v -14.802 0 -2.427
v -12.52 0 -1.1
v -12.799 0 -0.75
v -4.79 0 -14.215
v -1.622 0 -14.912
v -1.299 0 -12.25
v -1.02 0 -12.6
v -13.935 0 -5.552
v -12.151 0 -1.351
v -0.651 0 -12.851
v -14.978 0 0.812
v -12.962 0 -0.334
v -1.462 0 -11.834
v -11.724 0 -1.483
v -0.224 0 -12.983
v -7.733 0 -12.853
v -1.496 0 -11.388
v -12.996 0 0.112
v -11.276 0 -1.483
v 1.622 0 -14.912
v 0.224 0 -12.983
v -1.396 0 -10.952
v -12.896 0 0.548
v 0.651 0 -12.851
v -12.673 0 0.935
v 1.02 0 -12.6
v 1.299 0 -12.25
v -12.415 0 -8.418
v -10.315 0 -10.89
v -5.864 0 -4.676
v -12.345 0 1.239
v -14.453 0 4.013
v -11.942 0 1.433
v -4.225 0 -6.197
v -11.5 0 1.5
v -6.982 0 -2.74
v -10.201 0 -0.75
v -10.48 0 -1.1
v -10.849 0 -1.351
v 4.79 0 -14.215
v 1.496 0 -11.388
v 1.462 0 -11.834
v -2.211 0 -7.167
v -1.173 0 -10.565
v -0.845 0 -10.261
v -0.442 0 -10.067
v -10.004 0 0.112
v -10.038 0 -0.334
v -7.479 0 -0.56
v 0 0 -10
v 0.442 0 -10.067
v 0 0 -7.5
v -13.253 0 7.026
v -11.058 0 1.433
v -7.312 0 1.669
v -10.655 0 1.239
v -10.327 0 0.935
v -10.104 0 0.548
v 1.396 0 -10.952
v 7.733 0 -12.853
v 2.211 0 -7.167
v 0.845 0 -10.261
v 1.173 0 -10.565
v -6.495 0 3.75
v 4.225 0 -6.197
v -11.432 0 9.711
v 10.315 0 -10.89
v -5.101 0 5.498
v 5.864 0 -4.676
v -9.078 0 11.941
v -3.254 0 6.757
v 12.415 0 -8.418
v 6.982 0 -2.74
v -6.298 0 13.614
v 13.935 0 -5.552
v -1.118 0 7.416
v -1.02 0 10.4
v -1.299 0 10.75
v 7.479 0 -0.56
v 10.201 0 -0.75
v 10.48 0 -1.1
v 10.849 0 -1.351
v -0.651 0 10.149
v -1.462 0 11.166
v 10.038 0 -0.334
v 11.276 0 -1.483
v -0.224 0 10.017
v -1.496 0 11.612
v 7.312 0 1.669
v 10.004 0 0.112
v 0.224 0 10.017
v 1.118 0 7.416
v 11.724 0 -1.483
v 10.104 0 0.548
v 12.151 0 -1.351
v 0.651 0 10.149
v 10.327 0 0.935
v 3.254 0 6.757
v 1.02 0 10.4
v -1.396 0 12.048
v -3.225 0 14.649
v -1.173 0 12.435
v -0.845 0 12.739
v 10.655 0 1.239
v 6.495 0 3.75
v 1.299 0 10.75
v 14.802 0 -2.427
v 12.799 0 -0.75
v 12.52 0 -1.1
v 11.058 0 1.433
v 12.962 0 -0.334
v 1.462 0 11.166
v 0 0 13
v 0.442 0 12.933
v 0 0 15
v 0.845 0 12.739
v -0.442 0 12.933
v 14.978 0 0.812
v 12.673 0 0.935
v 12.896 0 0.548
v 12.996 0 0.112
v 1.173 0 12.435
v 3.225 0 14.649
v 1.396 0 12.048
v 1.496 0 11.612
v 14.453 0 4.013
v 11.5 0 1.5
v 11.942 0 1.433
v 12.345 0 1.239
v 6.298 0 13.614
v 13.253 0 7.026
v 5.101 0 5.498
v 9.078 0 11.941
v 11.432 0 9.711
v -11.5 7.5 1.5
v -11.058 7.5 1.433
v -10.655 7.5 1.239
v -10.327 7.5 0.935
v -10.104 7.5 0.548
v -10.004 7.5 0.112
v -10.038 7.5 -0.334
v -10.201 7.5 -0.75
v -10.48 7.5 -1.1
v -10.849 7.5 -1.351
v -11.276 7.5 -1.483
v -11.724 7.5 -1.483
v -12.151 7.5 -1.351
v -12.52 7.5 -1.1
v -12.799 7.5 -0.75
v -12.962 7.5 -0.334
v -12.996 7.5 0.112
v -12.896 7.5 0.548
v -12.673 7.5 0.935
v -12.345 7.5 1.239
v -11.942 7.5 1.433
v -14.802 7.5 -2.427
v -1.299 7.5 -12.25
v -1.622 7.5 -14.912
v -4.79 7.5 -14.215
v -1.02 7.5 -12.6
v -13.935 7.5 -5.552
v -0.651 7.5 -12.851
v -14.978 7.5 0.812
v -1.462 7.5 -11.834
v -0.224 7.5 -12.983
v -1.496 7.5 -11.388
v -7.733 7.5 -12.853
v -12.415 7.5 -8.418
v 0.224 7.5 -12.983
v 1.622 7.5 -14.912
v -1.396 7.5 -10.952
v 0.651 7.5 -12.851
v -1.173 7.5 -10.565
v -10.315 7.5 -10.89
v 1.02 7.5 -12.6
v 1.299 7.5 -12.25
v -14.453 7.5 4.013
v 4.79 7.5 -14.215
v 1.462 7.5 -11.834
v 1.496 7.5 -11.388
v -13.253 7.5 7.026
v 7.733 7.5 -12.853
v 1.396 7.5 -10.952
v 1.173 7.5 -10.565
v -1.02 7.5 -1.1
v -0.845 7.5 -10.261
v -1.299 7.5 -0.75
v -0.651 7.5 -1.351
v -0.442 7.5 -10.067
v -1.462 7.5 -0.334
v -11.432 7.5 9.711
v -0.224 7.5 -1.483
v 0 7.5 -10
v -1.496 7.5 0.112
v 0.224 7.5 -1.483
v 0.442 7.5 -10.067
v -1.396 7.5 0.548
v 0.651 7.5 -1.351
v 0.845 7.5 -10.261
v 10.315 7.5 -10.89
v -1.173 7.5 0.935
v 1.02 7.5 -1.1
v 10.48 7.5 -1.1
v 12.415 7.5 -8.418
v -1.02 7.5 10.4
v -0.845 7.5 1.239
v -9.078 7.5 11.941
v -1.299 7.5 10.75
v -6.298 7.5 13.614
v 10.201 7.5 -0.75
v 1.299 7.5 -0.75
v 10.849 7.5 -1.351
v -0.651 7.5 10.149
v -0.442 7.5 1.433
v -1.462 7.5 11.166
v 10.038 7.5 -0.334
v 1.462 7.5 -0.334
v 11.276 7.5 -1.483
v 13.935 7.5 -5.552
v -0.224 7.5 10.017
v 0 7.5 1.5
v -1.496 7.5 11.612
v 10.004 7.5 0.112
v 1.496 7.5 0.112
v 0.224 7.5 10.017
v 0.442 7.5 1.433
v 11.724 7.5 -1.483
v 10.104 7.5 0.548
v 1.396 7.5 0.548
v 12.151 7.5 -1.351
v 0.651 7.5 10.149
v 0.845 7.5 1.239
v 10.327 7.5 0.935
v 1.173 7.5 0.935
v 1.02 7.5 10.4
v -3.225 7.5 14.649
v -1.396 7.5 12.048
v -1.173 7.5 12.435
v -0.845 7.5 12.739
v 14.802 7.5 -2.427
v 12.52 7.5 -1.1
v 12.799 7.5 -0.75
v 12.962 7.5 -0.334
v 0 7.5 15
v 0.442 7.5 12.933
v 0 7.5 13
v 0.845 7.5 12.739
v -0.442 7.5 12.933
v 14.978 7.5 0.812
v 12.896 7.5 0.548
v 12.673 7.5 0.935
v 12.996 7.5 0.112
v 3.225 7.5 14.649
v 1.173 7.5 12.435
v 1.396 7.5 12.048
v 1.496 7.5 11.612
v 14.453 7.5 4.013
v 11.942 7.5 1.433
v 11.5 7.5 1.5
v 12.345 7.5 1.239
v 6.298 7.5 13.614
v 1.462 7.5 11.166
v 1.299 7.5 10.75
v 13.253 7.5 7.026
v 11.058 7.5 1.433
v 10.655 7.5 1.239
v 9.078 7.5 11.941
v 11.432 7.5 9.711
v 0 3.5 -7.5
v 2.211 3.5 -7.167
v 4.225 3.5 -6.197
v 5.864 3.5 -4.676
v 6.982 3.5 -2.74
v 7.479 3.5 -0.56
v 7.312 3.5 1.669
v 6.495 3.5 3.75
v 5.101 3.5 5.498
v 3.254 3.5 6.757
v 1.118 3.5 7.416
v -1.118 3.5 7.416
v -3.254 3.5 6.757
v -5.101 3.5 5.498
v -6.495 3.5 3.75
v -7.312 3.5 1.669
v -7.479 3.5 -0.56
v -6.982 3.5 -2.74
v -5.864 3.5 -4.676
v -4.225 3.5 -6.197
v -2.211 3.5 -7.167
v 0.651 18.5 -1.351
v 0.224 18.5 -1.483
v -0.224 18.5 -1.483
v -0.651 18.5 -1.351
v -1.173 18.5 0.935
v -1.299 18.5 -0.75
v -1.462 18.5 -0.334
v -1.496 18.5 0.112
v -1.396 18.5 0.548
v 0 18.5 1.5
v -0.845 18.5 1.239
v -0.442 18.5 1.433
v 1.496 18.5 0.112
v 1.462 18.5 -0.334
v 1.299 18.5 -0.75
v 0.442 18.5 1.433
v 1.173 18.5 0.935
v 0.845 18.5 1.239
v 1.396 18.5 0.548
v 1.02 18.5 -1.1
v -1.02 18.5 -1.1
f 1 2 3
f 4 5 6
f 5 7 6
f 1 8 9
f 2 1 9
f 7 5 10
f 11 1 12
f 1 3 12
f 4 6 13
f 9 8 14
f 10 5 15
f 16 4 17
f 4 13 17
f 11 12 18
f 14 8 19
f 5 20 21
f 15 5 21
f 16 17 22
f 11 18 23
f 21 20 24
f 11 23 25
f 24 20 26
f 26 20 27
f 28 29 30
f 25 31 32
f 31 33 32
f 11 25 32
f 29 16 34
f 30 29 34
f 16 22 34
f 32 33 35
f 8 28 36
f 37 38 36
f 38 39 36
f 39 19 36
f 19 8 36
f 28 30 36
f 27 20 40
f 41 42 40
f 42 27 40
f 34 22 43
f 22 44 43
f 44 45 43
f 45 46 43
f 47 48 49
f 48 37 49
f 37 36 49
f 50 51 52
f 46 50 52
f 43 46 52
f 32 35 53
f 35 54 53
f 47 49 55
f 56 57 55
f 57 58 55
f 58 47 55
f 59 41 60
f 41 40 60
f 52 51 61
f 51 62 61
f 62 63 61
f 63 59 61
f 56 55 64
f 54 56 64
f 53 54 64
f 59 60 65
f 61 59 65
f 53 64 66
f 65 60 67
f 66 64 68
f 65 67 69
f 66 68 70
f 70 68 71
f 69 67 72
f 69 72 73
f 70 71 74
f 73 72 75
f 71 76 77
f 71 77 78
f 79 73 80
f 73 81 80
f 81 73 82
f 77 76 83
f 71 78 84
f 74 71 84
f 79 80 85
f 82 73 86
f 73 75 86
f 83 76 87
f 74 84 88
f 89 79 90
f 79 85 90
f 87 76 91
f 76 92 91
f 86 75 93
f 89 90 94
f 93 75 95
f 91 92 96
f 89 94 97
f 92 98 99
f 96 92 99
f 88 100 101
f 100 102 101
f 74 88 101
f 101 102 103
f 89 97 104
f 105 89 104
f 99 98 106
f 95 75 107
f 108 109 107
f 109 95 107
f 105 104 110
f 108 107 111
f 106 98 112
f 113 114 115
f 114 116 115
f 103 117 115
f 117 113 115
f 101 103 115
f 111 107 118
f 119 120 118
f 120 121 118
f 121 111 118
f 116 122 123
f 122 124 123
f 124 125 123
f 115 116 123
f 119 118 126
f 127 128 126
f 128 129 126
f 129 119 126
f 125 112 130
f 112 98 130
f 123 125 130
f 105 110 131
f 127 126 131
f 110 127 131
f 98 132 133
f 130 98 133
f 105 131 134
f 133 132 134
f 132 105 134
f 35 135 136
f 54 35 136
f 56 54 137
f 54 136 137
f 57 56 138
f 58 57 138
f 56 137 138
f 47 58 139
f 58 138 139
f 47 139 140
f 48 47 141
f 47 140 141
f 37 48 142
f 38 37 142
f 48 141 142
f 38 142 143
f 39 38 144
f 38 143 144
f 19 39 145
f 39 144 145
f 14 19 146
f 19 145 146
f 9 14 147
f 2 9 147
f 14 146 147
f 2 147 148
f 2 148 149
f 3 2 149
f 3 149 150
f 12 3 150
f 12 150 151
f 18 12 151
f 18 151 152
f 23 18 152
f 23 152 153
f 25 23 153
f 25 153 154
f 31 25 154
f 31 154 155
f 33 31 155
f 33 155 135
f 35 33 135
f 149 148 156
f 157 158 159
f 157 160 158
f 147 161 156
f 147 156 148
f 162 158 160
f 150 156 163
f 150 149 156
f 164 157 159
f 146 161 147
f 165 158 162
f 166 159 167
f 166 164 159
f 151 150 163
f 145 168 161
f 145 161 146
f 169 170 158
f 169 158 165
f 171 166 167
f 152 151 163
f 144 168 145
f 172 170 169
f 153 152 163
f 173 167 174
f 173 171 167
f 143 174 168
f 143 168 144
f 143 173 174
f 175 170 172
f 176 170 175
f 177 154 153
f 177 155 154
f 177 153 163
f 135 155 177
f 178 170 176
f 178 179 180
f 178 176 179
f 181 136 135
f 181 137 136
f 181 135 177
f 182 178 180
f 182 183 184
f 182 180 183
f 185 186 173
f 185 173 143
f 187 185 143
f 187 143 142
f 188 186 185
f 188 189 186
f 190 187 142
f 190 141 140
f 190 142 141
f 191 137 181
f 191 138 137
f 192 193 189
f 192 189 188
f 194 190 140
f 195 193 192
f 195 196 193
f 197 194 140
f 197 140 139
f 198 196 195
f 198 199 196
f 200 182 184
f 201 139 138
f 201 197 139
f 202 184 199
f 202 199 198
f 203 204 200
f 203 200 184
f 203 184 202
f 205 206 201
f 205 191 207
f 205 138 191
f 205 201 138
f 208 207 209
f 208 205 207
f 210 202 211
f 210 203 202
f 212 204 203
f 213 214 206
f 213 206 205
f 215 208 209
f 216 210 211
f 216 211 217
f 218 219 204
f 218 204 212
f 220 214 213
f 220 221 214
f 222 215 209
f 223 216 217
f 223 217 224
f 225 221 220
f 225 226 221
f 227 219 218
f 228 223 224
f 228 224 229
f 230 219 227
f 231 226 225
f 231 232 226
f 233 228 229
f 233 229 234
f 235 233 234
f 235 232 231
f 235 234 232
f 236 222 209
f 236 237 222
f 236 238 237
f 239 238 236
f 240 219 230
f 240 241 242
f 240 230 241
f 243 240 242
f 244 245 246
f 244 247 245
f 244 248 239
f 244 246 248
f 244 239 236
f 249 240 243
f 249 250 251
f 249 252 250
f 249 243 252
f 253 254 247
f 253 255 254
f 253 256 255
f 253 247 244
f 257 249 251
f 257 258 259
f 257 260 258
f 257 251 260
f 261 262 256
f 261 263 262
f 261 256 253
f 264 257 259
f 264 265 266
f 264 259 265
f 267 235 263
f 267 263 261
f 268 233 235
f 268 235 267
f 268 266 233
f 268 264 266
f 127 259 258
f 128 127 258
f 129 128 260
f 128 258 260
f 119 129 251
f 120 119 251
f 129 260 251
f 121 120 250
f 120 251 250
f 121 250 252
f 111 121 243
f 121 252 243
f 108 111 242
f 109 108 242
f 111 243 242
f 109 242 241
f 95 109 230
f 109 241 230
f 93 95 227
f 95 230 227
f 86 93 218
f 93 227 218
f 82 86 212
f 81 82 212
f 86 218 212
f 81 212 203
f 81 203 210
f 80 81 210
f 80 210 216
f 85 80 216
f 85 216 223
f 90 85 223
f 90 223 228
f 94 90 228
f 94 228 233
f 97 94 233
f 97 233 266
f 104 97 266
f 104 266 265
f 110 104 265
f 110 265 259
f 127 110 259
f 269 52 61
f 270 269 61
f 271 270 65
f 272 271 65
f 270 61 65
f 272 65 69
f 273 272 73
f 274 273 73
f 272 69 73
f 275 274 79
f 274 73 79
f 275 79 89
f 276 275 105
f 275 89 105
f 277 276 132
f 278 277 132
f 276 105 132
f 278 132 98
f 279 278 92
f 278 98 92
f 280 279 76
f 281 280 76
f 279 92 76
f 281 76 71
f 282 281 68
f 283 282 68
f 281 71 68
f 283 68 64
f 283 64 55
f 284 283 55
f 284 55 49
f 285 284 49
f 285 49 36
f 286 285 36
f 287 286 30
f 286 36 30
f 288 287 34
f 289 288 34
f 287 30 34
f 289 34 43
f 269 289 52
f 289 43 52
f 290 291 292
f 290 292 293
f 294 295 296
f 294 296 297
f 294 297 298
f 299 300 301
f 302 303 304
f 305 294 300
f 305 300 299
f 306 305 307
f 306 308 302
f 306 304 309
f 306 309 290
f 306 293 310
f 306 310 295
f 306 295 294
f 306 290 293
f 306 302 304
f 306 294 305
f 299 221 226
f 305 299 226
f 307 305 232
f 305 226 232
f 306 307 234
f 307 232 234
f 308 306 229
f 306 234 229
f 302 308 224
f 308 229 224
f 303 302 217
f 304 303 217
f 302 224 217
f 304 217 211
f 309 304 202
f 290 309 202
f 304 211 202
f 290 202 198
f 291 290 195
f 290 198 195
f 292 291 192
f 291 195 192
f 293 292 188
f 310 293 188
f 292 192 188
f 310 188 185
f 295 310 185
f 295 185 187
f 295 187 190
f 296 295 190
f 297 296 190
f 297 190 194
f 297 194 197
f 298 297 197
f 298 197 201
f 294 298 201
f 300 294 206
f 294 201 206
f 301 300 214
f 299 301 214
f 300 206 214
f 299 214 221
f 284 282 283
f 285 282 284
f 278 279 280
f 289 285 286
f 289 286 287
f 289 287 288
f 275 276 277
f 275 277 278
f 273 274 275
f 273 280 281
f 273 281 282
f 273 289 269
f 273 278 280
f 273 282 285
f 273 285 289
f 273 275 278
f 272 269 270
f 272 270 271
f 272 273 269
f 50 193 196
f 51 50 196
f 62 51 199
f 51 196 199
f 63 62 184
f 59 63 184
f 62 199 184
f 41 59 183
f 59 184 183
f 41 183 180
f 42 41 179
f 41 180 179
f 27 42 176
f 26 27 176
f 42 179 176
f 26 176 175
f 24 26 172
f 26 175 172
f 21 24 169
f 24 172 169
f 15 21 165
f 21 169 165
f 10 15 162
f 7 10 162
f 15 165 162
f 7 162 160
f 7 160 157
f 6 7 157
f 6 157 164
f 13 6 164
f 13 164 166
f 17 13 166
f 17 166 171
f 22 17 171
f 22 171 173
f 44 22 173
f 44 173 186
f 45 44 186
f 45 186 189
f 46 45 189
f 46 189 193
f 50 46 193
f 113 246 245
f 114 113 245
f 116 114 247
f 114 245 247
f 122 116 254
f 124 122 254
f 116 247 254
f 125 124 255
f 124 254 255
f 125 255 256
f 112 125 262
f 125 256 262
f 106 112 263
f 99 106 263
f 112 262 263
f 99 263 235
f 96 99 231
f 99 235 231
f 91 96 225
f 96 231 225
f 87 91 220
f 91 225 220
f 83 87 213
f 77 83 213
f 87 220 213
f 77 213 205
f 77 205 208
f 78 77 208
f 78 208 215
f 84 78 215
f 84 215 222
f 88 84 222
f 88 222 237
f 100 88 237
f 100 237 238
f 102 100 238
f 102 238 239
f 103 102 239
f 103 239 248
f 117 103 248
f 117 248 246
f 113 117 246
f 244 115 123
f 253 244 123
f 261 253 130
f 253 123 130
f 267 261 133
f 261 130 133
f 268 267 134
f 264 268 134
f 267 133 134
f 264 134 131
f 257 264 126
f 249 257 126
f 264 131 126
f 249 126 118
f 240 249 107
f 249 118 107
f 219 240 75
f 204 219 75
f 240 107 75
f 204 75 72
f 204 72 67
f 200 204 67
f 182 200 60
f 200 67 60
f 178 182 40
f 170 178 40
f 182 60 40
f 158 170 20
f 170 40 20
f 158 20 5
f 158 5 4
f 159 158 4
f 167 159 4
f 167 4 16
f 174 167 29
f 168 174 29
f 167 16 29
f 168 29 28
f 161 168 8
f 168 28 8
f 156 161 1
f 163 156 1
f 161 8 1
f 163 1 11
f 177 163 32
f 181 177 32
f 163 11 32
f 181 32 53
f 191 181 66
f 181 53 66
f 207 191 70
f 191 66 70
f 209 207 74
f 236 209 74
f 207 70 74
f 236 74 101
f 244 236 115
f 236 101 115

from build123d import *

# Parameters (mm, degrees)
SKETCH1_R           = 15
BOSS_EXTRUDE1_DEPTH = 7.5
SKETCH2_R           = 1.5
BOSS_EXTRUDE2_DEPTH = 11
SKETCH4_R           = 7.5
CUT_EXTRUDE3_DEPTH  = 3.5
SKETCH6_R           = 1.5
CUT_EXTRUDE4_DEPTH  = 24.895606291


with BuildPart() as part:
    # Sketch1 → Boss-Extrude1 (new body)
    with BuildSketch(Plane(origin=(0, 0, 0), x_dir=(1, 0, 0), z_dir=(0, 1, 0))):
        with Locations(Location((0, 0, 0), (0, 0, 270))):
            Circle(SKETCH1_R)
    extrude(amount=BOSS_EXTRUDE1_DEPTH)

    # Sketch2 → Boss-Extrude2 (add)
    with BuildSketch(Plane(origin=(0, 7.5, 0), x_dir=(1, 0, 0), z_dir=(0, 1, 0))):
        with Locations(Location((0, 0, 0), (0, 0, 270))):
            Circle(SKETCH2_R)
    extrude(amount=BOSS_EXTRUDE2_DEPTH)

    # Sketch4 → Cut-Extrude3 (cut)
    with BuildSketch(Plane.XZ):
        with Locations(Location((0, 0, 0), (0, 0, 270))):
            Circle(SKETCH4_R)
    extrude(amount=-CUT_EXTRUDE3_DEPTH, mode=Mode.SUBTRACT)

    # Sketch6 → Cut-Extrude4 (cut, through all)
    with BuildSketch(Plane(origin=(0, 7.5, 0), x_dir=(1, 0, 0), z_dir=(0, 1, 0))):
        with Locations(Location((0, 11.5, 0), (0, 0, 270))):
            Circle(SKETCH6_R)
        with Locations(Location((11.5, 0, 0), (0, 0, 270))):
            Circle(SKETCH6_R)
        with Locations(Location((0, -11.5, 0), (0, 0, 270))):
            Circle(SKETCH6_R)
        with Locations(Location((-11.5, 0, 0), (0, 0, 270))):
            Circle(SKETCH6_R)
    extrude(amount=-CUT_EXTRUDE4_DEPTH, mode=Mode.SUBTRACT)


solid = part.part
